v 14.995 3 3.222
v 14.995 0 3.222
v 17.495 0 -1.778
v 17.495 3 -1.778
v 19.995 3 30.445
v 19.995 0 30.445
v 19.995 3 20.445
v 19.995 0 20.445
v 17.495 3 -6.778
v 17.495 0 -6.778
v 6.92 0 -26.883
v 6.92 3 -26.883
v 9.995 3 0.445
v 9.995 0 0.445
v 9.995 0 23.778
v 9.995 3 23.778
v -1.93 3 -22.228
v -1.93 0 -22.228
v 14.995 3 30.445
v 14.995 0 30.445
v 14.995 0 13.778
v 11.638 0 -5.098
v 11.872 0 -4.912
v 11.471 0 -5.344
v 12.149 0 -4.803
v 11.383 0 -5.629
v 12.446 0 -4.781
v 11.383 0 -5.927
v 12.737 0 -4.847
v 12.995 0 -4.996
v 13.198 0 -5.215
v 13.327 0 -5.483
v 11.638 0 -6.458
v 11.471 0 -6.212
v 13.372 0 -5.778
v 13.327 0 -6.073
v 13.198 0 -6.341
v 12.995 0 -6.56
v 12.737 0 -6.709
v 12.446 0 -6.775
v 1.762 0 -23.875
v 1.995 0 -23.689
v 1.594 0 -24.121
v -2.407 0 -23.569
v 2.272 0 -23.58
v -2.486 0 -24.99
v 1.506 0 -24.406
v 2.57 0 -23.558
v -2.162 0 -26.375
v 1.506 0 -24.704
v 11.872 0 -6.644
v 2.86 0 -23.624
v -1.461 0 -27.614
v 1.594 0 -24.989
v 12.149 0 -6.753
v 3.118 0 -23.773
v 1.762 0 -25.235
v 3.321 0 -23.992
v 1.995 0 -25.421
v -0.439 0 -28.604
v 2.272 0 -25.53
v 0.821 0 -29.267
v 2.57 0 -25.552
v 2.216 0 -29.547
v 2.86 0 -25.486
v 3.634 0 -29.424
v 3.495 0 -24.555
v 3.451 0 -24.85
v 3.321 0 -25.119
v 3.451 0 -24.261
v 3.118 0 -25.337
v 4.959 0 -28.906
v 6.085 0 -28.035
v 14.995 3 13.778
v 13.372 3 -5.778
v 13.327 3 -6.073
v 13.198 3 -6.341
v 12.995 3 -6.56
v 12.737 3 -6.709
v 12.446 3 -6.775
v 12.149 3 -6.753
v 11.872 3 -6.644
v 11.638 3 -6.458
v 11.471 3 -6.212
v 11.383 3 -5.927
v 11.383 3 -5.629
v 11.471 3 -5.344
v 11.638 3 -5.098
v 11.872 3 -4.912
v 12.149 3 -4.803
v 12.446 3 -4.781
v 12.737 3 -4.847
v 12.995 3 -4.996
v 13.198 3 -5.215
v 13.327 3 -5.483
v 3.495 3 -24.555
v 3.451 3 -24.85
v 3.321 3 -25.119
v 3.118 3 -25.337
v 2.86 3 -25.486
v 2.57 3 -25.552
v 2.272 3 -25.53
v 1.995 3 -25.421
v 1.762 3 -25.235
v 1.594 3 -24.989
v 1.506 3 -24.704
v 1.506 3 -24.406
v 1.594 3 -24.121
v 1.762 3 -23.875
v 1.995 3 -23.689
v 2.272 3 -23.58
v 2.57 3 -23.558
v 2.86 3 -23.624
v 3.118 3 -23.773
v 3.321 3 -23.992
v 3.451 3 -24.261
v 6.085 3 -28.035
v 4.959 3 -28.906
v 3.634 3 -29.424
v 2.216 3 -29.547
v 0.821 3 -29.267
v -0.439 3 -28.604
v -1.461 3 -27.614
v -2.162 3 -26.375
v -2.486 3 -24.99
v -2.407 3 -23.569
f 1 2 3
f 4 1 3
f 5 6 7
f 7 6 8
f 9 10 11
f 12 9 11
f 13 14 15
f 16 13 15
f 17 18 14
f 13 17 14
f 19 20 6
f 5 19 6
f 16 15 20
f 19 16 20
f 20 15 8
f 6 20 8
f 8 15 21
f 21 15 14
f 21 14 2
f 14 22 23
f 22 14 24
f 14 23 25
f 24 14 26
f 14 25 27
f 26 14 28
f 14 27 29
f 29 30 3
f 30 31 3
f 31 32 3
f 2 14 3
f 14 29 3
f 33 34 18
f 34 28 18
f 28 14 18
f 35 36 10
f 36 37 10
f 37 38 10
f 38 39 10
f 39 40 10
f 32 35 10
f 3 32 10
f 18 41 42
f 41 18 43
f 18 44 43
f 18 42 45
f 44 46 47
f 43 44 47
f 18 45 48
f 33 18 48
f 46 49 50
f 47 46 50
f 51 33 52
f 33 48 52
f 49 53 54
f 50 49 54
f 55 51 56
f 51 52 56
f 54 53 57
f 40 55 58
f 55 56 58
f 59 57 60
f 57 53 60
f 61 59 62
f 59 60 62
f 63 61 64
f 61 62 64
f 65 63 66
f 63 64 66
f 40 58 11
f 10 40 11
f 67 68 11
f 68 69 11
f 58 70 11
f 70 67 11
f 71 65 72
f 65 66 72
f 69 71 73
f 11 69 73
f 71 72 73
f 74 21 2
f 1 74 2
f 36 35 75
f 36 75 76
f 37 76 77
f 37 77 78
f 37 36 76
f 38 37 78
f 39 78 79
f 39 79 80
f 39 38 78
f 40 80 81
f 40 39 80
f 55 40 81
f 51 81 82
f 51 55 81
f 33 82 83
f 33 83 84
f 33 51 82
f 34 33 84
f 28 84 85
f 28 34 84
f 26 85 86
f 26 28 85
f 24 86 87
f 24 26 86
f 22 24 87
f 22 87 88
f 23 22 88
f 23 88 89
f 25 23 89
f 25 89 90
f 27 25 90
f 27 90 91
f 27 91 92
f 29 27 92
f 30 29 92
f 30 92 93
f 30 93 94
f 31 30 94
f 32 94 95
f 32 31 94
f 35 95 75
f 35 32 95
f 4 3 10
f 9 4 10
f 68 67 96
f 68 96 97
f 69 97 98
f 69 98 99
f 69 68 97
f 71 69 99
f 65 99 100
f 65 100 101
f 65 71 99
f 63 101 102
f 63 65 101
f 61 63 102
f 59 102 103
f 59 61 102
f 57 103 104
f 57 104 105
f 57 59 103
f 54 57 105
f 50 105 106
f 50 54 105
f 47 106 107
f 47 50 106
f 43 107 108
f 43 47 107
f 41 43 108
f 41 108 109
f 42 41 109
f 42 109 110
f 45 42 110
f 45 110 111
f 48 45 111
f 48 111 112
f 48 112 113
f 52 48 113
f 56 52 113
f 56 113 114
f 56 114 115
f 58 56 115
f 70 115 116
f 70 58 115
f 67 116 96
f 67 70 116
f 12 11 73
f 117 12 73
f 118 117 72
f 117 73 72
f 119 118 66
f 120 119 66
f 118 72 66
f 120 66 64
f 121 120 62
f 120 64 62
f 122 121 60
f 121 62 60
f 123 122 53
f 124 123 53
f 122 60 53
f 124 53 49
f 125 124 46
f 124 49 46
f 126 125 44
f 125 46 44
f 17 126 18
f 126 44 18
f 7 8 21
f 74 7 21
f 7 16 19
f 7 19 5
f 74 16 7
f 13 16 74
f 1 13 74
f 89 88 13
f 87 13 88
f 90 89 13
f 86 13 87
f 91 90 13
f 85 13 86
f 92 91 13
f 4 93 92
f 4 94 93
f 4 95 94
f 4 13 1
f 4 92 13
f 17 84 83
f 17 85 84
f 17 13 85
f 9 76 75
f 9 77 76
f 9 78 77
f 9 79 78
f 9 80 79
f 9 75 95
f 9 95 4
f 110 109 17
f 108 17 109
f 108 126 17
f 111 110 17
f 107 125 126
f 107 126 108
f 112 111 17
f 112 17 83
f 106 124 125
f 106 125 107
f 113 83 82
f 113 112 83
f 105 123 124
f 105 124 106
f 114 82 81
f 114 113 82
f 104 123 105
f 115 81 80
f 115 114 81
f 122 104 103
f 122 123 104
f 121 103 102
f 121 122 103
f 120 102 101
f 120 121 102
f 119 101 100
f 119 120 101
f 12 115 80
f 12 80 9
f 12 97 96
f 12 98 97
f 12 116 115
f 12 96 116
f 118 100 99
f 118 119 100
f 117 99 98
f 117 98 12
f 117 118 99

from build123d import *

# Parameters (mm, degrees)
CROQUIS1_R              = 1
SALIENTE_EXTRUIR1_DEPTH = 3


with BuildPart() as part:
    # Croquis1 → Saliente-Extruir1 (new body)
    with BuildSketch(Plane(origin=(0, 0, 0), x_dir=(1, 0, 0), z_dir=(0, 1, 0))):
        with BuildLine():
            Line((-1.930199007, 22.227708448), (9.995007766, -0.44472952))
            Line((9.995007766, -0.44472952), (9.995007766, -23.778062853))
            Line((9.995007766, -23.778062853), (14.995007766, -30.44472952))
            Line((14.995007766, -30.44472952), (19.995007766, -30.44472952))
            Line((19.995007766, -30.44472952), (19.995007766, -20.44472952))
            Line((19.995007766, -20.44472952), (14.995007766, -13.778062853))
            Line((14.995007766, -13.778062853), (14.995007766, -3.222172626))
            Line((14.995007766, -3.222172626), (17.495007766, 1.777827374))
            Line((17.495007766, 1.777827374), (17.495007766, 6.777827374))
            Line((17.495007766, 6.777827374), (6.920214539, 26.882832512))
            ThreePointArc((6.920214539, 26.882832512), (0.167445734, 28.980477254), (-1.930199007, 22.227708448))
        make_face()
        with Locations((2.495007766, 24.55527048)):
            Circle(CROQUIS1_R, mode=Mode.SUBTRACT)
        with Locations((12.371532383, 5.777827374)):
            Circle(CROQUIS1_R, mode=Mode.SUBTRACT)
    extrude(amount=SALIENTE_EXTRUIR1_DEPTH)


solid = part.part
